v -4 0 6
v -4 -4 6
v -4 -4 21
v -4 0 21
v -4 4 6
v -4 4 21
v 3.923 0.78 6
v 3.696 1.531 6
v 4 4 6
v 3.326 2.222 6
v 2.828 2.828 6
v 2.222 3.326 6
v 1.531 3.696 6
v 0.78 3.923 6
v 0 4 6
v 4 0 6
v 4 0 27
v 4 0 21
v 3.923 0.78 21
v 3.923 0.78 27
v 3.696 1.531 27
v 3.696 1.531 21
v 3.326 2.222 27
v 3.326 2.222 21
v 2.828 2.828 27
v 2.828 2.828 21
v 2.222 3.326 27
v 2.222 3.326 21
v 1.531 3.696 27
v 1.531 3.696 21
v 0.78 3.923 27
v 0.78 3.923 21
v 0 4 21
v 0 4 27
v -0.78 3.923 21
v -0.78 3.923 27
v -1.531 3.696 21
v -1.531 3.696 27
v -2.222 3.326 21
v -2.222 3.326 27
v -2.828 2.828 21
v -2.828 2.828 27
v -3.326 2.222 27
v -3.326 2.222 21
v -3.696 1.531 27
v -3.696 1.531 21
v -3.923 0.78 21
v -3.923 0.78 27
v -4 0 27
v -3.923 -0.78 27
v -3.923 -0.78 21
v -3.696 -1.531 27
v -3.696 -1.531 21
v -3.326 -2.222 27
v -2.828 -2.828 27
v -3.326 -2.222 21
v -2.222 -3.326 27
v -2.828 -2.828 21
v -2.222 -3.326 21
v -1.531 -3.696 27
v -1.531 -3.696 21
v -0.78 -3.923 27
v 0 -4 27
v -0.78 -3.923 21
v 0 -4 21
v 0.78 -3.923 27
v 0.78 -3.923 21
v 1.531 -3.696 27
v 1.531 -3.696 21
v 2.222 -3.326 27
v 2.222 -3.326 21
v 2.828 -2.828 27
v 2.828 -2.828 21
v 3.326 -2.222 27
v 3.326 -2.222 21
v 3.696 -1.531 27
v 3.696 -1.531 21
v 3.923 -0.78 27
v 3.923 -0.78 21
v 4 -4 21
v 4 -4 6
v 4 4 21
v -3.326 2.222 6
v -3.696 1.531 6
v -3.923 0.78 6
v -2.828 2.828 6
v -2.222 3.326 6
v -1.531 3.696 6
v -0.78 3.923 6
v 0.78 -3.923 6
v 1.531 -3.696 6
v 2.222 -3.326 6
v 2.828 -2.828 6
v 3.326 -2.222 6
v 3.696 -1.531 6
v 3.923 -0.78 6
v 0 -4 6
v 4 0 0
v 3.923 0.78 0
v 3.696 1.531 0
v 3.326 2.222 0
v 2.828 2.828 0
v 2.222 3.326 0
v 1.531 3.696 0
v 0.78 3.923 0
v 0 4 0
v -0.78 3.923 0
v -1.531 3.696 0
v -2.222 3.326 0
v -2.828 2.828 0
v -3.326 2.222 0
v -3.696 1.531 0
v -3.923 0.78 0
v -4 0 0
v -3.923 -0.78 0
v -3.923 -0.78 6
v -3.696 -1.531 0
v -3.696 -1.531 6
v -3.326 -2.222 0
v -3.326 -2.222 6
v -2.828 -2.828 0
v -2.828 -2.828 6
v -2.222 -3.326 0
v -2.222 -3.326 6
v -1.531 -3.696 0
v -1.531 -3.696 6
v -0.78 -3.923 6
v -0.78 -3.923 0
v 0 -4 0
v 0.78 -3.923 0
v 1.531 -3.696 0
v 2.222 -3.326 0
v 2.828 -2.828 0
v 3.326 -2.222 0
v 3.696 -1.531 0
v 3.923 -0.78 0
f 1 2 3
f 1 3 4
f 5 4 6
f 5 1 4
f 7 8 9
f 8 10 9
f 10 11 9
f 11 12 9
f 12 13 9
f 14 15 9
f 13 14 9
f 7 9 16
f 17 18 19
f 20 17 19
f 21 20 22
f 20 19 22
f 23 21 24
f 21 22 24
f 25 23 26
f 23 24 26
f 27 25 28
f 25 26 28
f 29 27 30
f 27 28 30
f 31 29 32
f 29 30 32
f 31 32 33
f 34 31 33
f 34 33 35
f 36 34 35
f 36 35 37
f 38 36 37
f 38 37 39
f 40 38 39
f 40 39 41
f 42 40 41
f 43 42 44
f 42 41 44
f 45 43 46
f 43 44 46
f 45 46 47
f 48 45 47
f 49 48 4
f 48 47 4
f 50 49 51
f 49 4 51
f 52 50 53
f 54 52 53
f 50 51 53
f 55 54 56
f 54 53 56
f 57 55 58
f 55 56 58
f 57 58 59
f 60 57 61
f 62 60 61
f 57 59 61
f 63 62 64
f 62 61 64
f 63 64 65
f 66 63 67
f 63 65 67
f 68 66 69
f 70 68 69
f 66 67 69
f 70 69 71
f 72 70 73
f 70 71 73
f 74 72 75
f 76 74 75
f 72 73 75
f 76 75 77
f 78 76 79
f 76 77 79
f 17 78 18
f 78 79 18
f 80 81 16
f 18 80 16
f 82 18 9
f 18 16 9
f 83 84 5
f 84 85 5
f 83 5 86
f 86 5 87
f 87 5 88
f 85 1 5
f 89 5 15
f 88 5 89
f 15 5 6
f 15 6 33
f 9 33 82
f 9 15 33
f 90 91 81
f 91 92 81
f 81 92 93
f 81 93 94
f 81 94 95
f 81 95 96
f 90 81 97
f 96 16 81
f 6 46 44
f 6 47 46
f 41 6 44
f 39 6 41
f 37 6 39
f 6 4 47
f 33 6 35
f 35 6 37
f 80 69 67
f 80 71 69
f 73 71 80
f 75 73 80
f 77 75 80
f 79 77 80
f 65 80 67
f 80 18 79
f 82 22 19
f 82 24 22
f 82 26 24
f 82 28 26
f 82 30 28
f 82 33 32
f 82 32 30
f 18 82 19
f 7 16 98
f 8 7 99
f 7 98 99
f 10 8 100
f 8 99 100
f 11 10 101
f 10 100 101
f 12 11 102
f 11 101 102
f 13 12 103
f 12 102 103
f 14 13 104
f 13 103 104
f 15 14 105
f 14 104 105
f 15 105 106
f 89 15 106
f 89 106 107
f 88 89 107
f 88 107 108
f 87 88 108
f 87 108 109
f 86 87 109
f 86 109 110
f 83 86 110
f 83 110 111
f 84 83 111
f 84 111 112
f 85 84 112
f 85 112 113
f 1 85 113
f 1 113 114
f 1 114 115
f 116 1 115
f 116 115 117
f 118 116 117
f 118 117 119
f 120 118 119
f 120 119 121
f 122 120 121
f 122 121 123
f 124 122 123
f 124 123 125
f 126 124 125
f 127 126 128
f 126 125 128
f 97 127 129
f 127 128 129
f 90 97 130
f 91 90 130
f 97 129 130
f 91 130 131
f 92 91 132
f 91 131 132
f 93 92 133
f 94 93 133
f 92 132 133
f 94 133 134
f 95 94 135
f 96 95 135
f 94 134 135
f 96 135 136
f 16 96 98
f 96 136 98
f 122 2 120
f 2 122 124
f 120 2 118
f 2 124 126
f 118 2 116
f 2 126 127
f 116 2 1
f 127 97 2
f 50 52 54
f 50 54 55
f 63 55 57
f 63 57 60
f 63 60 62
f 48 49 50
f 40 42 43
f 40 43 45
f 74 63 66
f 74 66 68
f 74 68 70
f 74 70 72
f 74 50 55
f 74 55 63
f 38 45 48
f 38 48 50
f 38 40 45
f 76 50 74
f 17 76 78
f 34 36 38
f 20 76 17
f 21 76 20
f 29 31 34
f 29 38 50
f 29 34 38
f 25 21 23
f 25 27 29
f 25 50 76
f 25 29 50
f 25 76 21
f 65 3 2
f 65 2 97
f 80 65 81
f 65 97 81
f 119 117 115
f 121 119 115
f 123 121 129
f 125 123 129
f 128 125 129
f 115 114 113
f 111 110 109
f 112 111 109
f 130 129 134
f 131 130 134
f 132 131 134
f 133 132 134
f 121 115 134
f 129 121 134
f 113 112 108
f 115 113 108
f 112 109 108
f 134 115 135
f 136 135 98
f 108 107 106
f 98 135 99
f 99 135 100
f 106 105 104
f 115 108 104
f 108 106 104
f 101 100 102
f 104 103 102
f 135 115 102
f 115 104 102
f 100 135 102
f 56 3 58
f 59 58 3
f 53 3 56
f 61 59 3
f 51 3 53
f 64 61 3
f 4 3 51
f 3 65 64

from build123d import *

# Parameters (mm, degrees)
F0_R     = 4
F1_DEPTH = 6
F2_W     = 8
F2_H     = 8
F3_DEPTH = 15
F4_R     = 4
F5_DEPTH = 6


with BuildPart() as f1:
    # F0 (on Top) → F1 (new body)
    with BuildSketch(Plane.XY):
        Circle(F0_R)
    extrude(amount=F1_DEPTH)

    # F2 (on face) → F3 (join)
    with BuildSketch(Plane.XY.offset(6)):
        Rectangle(F2_W, F2_H)
    extrude(amount=F3_DEPTH)

    # F4 (on face) → F5 (join)
    with BuildSketch(Plane.XY.offset(21)):
        Circle(F4_R)
    extrude(amount=F5_DEPTH)


solid = f1.part
